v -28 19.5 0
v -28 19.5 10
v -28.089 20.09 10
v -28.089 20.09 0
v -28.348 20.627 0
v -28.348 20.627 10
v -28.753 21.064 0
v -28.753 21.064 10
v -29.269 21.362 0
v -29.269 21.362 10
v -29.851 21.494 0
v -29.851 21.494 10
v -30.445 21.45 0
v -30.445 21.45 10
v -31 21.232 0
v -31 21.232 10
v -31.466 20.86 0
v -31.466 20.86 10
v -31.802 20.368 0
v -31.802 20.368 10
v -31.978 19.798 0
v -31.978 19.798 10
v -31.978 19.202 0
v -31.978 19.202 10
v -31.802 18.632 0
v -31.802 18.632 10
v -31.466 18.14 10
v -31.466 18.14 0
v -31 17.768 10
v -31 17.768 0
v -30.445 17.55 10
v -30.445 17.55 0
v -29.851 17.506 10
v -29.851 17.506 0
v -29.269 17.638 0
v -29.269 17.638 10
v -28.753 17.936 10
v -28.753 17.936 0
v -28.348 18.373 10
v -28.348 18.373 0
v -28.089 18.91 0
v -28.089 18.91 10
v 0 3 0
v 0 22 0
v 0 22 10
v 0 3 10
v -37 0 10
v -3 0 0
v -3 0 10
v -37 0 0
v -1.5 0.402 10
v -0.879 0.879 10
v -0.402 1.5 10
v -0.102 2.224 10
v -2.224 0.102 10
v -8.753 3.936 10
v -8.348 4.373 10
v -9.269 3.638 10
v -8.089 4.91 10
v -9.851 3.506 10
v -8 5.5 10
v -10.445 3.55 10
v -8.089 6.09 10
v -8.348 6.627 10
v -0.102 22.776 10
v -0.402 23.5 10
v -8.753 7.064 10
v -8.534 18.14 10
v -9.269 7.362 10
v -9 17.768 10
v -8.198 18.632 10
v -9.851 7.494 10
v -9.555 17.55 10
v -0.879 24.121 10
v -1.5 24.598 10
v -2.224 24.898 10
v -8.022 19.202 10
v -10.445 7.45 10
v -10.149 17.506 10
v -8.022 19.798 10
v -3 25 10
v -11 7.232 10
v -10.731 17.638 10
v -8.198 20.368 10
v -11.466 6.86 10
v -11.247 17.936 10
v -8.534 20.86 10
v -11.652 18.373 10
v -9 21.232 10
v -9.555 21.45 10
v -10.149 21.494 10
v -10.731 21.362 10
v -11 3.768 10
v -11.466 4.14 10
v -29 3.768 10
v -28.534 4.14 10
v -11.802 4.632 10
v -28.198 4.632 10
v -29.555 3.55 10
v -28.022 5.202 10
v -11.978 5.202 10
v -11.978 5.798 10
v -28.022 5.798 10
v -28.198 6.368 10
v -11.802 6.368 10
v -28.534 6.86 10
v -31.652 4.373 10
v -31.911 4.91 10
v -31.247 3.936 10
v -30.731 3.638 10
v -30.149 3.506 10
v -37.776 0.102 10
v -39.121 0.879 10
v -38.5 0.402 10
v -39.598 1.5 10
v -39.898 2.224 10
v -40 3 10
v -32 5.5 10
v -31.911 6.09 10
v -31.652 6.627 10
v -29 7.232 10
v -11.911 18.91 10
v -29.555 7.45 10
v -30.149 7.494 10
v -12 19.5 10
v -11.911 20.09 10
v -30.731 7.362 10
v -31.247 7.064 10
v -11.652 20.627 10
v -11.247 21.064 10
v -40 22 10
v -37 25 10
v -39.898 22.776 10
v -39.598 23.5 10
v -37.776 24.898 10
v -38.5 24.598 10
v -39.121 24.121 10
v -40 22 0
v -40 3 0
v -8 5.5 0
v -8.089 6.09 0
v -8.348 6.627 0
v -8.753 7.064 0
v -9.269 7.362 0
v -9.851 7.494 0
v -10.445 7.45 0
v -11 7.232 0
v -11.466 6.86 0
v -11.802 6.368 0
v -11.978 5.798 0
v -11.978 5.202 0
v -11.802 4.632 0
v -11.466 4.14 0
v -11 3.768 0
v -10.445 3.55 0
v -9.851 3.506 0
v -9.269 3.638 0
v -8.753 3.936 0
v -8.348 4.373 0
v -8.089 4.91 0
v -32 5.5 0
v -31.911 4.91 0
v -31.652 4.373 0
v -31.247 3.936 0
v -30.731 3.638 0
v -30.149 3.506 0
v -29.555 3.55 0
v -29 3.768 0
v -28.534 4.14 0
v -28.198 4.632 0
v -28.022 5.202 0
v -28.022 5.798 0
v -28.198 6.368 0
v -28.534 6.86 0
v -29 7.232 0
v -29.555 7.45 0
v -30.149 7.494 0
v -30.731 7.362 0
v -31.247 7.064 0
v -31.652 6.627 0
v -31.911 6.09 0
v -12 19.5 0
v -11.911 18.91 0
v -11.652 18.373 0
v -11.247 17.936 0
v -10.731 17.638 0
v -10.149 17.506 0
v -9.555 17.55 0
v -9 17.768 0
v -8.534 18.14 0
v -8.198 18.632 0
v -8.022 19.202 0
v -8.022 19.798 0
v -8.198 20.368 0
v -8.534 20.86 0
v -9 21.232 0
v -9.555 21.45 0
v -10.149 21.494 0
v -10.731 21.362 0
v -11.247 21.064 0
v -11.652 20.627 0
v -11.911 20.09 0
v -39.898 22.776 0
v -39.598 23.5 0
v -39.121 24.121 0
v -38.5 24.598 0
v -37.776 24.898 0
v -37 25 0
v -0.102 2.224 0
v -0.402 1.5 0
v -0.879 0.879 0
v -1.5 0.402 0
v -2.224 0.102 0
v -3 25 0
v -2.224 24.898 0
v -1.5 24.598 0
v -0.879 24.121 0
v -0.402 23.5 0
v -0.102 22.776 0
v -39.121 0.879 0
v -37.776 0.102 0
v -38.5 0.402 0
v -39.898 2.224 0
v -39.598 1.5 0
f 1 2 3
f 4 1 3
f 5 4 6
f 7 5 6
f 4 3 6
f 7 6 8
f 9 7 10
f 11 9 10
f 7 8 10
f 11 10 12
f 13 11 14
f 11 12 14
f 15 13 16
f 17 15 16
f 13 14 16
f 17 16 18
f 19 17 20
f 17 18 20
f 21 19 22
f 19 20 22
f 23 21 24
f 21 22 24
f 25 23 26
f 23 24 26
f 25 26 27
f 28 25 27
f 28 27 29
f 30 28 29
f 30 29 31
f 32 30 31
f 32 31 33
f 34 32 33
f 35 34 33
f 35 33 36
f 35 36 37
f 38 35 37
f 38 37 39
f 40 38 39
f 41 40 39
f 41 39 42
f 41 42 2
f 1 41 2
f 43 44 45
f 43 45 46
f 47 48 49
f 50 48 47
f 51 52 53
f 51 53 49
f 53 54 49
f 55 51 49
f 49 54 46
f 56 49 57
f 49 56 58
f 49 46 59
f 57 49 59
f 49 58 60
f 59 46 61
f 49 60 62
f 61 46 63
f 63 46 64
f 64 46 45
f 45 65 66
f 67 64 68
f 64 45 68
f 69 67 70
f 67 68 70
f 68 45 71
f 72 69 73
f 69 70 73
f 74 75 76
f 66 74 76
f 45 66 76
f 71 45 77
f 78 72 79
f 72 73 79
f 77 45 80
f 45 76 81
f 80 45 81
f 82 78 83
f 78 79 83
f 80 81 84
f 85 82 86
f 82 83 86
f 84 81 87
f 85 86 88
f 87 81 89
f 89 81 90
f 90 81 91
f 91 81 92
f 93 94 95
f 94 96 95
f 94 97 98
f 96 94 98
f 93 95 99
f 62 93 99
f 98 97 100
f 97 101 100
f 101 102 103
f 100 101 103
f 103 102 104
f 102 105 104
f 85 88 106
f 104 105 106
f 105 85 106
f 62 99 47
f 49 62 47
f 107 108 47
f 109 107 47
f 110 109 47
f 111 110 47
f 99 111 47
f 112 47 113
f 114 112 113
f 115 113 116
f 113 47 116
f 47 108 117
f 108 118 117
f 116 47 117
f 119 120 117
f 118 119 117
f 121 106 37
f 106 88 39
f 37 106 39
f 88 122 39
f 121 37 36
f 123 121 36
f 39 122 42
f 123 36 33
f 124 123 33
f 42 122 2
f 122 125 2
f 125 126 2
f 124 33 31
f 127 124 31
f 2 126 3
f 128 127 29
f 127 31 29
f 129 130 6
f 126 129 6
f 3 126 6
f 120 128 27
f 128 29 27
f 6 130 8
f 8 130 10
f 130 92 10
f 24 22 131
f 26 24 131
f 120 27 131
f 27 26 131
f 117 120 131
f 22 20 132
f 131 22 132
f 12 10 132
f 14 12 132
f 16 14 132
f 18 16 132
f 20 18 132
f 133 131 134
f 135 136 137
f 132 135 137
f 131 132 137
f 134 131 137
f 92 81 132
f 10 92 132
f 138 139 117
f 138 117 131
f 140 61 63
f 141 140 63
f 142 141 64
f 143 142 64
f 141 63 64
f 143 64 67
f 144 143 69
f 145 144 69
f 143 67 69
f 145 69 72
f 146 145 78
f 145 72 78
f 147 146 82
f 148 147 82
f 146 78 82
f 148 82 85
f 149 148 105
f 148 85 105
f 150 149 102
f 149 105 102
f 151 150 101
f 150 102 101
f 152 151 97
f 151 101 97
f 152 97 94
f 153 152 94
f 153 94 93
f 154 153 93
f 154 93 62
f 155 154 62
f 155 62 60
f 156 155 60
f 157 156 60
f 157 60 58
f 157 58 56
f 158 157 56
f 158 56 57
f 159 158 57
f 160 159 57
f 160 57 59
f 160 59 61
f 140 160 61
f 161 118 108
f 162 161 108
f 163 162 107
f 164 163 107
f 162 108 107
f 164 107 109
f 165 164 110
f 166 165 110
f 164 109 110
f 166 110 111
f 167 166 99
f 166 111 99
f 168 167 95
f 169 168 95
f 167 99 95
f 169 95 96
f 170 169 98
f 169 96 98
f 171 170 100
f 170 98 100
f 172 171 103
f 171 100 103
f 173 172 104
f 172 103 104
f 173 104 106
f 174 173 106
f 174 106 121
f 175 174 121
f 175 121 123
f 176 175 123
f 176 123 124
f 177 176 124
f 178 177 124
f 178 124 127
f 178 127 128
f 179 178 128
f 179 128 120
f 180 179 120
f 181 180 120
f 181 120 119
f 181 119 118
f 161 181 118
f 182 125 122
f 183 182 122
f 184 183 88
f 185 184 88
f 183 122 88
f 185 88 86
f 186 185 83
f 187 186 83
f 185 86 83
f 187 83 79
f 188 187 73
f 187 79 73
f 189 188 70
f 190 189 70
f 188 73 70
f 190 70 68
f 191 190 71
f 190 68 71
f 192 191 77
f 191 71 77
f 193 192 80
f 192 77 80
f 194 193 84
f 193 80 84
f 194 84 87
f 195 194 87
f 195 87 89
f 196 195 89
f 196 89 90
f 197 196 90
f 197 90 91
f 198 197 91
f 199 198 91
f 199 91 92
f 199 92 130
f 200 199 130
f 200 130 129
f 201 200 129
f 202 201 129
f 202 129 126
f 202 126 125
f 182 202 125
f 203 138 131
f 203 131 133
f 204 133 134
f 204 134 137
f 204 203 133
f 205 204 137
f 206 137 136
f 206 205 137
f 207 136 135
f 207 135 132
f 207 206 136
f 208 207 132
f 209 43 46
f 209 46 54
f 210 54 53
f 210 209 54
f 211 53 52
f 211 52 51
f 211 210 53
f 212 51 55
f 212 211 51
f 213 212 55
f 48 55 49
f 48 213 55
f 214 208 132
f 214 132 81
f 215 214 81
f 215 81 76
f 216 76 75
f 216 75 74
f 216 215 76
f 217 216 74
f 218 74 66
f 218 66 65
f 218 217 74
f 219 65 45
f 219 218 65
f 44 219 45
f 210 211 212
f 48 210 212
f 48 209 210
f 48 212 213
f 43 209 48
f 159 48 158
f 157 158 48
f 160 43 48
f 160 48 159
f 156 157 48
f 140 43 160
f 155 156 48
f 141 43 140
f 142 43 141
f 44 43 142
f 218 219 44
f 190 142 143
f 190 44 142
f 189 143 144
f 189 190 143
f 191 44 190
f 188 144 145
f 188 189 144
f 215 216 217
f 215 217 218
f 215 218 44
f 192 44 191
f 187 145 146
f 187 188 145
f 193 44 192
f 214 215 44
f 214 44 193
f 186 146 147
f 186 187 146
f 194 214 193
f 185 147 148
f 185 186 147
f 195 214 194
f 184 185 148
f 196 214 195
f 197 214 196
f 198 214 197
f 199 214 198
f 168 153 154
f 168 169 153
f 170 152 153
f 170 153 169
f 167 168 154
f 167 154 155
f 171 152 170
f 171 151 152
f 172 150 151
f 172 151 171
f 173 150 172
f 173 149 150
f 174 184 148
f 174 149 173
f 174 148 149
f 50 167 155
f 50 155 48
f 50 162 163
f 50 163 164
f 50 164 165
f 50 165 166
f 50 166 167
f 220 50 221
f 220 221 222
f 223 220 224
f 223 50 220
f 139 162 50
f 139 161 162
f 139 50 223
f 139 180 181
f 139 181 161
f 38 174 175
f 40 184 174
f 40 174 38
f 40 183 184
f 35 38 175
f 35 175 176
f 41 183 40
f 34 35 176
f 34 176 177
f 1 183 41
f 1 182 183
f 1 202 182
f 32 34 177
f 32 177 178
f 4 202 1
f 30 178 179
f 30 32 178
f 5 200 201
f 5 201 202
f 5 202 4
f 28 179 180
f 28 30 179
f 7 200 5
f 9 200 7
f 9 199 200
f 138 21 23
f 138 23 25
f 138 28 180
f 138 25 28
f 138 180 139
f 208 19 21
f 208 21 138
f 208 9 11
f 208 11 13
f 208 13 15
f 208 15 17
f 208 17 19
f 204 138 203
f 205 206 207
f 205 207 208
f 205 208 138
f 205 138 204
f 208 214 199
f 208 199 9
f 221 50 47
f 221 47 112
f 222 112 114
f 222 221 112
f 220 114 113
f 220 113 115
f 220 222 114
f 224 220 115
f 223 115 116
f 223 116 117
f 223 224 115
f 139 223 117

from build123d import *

# Parameters (mm, degrees)
EXTRUDE_1_DEPTH     = 10
CUT_EXTRUDE_1_REACH = 50.218
SKETCH_3_R          = 2


with BuildPart() as part:
    # 草图1 → 凸台-拉伸1 (new body)
    with BuildSketch(Plane.XY):
        with BuildLine():
            Line((-3, 0), (-37, 0))
            ThreePointArc((-37, 0), (-39.121320344, 0.878679656), (-40, 3))
            Line((-40, 3), (-40, 22))
            ThreePointArc((-40, 22), (-39.121320344, 24.121320344), (-37, 25))
            Line((-37, 25), (-3, 25))
            ThreePointArc((-3, 25), (-0.878679656, 24.121320344), (0, 22))
            Line((0, 22), (0, 3))
            ThreePointArc((0, 3), (-0.878679656, 0.878679656), (-3, 0))
        make_face()
    extrude(amount=EXTRUDE_1_DEPTH)

    # 草图3 → 切除-拉伸1 (cut, up to next)
    with BuildSketch(Plane.XY.offset(10), mode=Mode.PRIVATE) as cut_extrude_1_sk1:
        with Locations((-30, 19.5)):
            Circle(SKETCH_3_R)
    cut_extrude_1_tool1 = extrude(cut_extrude_1_sk1.sketch, amount=-CUT_EXTRUDE_1_REACH, mode=Mode.PRIVATE) & part.part
    # 草图3 → 切除-拉伸1 (cut, up to next)
    with BuildSketch(Plane.XY.offset(10), mode=Mode.PRIVATE) as cut_extrude_1_sk2:
        with Locations(Location((-30, 5.5, 0), (0, 0, 180))):
            Circle(SKETCH_3_R)
    cut_extrude_1_tool2 = extrude(cut_extrude_1_sk2.sketch, amount=-CUT_EXTRUDE_1_REACH, mode=Mode.PRIVATE) & part.part
    # 草图3 → 切除-拉伸1 (cut, up to next)
    with BuildSketch(Plane.XY.offset(10), mode=Mode.PRIVATE) as cut_extrude_1_sk3:
        with Locations(Location((-10, 19.5, 0), (0, 0, 180))):
            Circle(SKETCH_3_R)
    cut_extrude_1_tool3 = extrude(cut_extrude_1_sk3.sketch, amount=-CUT_EXTRUDE_1_REACH, mode=Mode.PRIVATE) & part.part
    # 草图3 → 切除-拉伸1 (cut, up to next)
    with BuildSketch(Plane.XY.offset(10), mode=Mode.PRIVATE) as cut_extrude_1_sk4:
        with Locations((-10, 5.5)):
            Circle(SKETCH_3_R)
    cut_extrude_1_tool4 = extrude(cut_extrude_1_sk4.sketch, amount=-CUT_EXTRUDE_1_REACH, mode=Mode.PRIVATE) & part.part
    add(cut_extrude_1_tool1.solids().sort_by_distance((-30, 19.5, 10))[0], mode=Mode.SUBTRACT)
    add(cut_extrude_1_tool2.solids().sort_by_distance((-30, 5.5, 10))[0], mode=Mode.SUBTRACT)
    add(cut_extrude_1_tool3.solids().sort_by_distance((-10, 19.5, 10))[0], mode=Mode.SUBTRACT)
    add(cut_extrude_1_tool4.solids().sort_by_distance((-10, 5.5, 10))[0], mode=Mode.SUBTRACT)


solid = part.part
